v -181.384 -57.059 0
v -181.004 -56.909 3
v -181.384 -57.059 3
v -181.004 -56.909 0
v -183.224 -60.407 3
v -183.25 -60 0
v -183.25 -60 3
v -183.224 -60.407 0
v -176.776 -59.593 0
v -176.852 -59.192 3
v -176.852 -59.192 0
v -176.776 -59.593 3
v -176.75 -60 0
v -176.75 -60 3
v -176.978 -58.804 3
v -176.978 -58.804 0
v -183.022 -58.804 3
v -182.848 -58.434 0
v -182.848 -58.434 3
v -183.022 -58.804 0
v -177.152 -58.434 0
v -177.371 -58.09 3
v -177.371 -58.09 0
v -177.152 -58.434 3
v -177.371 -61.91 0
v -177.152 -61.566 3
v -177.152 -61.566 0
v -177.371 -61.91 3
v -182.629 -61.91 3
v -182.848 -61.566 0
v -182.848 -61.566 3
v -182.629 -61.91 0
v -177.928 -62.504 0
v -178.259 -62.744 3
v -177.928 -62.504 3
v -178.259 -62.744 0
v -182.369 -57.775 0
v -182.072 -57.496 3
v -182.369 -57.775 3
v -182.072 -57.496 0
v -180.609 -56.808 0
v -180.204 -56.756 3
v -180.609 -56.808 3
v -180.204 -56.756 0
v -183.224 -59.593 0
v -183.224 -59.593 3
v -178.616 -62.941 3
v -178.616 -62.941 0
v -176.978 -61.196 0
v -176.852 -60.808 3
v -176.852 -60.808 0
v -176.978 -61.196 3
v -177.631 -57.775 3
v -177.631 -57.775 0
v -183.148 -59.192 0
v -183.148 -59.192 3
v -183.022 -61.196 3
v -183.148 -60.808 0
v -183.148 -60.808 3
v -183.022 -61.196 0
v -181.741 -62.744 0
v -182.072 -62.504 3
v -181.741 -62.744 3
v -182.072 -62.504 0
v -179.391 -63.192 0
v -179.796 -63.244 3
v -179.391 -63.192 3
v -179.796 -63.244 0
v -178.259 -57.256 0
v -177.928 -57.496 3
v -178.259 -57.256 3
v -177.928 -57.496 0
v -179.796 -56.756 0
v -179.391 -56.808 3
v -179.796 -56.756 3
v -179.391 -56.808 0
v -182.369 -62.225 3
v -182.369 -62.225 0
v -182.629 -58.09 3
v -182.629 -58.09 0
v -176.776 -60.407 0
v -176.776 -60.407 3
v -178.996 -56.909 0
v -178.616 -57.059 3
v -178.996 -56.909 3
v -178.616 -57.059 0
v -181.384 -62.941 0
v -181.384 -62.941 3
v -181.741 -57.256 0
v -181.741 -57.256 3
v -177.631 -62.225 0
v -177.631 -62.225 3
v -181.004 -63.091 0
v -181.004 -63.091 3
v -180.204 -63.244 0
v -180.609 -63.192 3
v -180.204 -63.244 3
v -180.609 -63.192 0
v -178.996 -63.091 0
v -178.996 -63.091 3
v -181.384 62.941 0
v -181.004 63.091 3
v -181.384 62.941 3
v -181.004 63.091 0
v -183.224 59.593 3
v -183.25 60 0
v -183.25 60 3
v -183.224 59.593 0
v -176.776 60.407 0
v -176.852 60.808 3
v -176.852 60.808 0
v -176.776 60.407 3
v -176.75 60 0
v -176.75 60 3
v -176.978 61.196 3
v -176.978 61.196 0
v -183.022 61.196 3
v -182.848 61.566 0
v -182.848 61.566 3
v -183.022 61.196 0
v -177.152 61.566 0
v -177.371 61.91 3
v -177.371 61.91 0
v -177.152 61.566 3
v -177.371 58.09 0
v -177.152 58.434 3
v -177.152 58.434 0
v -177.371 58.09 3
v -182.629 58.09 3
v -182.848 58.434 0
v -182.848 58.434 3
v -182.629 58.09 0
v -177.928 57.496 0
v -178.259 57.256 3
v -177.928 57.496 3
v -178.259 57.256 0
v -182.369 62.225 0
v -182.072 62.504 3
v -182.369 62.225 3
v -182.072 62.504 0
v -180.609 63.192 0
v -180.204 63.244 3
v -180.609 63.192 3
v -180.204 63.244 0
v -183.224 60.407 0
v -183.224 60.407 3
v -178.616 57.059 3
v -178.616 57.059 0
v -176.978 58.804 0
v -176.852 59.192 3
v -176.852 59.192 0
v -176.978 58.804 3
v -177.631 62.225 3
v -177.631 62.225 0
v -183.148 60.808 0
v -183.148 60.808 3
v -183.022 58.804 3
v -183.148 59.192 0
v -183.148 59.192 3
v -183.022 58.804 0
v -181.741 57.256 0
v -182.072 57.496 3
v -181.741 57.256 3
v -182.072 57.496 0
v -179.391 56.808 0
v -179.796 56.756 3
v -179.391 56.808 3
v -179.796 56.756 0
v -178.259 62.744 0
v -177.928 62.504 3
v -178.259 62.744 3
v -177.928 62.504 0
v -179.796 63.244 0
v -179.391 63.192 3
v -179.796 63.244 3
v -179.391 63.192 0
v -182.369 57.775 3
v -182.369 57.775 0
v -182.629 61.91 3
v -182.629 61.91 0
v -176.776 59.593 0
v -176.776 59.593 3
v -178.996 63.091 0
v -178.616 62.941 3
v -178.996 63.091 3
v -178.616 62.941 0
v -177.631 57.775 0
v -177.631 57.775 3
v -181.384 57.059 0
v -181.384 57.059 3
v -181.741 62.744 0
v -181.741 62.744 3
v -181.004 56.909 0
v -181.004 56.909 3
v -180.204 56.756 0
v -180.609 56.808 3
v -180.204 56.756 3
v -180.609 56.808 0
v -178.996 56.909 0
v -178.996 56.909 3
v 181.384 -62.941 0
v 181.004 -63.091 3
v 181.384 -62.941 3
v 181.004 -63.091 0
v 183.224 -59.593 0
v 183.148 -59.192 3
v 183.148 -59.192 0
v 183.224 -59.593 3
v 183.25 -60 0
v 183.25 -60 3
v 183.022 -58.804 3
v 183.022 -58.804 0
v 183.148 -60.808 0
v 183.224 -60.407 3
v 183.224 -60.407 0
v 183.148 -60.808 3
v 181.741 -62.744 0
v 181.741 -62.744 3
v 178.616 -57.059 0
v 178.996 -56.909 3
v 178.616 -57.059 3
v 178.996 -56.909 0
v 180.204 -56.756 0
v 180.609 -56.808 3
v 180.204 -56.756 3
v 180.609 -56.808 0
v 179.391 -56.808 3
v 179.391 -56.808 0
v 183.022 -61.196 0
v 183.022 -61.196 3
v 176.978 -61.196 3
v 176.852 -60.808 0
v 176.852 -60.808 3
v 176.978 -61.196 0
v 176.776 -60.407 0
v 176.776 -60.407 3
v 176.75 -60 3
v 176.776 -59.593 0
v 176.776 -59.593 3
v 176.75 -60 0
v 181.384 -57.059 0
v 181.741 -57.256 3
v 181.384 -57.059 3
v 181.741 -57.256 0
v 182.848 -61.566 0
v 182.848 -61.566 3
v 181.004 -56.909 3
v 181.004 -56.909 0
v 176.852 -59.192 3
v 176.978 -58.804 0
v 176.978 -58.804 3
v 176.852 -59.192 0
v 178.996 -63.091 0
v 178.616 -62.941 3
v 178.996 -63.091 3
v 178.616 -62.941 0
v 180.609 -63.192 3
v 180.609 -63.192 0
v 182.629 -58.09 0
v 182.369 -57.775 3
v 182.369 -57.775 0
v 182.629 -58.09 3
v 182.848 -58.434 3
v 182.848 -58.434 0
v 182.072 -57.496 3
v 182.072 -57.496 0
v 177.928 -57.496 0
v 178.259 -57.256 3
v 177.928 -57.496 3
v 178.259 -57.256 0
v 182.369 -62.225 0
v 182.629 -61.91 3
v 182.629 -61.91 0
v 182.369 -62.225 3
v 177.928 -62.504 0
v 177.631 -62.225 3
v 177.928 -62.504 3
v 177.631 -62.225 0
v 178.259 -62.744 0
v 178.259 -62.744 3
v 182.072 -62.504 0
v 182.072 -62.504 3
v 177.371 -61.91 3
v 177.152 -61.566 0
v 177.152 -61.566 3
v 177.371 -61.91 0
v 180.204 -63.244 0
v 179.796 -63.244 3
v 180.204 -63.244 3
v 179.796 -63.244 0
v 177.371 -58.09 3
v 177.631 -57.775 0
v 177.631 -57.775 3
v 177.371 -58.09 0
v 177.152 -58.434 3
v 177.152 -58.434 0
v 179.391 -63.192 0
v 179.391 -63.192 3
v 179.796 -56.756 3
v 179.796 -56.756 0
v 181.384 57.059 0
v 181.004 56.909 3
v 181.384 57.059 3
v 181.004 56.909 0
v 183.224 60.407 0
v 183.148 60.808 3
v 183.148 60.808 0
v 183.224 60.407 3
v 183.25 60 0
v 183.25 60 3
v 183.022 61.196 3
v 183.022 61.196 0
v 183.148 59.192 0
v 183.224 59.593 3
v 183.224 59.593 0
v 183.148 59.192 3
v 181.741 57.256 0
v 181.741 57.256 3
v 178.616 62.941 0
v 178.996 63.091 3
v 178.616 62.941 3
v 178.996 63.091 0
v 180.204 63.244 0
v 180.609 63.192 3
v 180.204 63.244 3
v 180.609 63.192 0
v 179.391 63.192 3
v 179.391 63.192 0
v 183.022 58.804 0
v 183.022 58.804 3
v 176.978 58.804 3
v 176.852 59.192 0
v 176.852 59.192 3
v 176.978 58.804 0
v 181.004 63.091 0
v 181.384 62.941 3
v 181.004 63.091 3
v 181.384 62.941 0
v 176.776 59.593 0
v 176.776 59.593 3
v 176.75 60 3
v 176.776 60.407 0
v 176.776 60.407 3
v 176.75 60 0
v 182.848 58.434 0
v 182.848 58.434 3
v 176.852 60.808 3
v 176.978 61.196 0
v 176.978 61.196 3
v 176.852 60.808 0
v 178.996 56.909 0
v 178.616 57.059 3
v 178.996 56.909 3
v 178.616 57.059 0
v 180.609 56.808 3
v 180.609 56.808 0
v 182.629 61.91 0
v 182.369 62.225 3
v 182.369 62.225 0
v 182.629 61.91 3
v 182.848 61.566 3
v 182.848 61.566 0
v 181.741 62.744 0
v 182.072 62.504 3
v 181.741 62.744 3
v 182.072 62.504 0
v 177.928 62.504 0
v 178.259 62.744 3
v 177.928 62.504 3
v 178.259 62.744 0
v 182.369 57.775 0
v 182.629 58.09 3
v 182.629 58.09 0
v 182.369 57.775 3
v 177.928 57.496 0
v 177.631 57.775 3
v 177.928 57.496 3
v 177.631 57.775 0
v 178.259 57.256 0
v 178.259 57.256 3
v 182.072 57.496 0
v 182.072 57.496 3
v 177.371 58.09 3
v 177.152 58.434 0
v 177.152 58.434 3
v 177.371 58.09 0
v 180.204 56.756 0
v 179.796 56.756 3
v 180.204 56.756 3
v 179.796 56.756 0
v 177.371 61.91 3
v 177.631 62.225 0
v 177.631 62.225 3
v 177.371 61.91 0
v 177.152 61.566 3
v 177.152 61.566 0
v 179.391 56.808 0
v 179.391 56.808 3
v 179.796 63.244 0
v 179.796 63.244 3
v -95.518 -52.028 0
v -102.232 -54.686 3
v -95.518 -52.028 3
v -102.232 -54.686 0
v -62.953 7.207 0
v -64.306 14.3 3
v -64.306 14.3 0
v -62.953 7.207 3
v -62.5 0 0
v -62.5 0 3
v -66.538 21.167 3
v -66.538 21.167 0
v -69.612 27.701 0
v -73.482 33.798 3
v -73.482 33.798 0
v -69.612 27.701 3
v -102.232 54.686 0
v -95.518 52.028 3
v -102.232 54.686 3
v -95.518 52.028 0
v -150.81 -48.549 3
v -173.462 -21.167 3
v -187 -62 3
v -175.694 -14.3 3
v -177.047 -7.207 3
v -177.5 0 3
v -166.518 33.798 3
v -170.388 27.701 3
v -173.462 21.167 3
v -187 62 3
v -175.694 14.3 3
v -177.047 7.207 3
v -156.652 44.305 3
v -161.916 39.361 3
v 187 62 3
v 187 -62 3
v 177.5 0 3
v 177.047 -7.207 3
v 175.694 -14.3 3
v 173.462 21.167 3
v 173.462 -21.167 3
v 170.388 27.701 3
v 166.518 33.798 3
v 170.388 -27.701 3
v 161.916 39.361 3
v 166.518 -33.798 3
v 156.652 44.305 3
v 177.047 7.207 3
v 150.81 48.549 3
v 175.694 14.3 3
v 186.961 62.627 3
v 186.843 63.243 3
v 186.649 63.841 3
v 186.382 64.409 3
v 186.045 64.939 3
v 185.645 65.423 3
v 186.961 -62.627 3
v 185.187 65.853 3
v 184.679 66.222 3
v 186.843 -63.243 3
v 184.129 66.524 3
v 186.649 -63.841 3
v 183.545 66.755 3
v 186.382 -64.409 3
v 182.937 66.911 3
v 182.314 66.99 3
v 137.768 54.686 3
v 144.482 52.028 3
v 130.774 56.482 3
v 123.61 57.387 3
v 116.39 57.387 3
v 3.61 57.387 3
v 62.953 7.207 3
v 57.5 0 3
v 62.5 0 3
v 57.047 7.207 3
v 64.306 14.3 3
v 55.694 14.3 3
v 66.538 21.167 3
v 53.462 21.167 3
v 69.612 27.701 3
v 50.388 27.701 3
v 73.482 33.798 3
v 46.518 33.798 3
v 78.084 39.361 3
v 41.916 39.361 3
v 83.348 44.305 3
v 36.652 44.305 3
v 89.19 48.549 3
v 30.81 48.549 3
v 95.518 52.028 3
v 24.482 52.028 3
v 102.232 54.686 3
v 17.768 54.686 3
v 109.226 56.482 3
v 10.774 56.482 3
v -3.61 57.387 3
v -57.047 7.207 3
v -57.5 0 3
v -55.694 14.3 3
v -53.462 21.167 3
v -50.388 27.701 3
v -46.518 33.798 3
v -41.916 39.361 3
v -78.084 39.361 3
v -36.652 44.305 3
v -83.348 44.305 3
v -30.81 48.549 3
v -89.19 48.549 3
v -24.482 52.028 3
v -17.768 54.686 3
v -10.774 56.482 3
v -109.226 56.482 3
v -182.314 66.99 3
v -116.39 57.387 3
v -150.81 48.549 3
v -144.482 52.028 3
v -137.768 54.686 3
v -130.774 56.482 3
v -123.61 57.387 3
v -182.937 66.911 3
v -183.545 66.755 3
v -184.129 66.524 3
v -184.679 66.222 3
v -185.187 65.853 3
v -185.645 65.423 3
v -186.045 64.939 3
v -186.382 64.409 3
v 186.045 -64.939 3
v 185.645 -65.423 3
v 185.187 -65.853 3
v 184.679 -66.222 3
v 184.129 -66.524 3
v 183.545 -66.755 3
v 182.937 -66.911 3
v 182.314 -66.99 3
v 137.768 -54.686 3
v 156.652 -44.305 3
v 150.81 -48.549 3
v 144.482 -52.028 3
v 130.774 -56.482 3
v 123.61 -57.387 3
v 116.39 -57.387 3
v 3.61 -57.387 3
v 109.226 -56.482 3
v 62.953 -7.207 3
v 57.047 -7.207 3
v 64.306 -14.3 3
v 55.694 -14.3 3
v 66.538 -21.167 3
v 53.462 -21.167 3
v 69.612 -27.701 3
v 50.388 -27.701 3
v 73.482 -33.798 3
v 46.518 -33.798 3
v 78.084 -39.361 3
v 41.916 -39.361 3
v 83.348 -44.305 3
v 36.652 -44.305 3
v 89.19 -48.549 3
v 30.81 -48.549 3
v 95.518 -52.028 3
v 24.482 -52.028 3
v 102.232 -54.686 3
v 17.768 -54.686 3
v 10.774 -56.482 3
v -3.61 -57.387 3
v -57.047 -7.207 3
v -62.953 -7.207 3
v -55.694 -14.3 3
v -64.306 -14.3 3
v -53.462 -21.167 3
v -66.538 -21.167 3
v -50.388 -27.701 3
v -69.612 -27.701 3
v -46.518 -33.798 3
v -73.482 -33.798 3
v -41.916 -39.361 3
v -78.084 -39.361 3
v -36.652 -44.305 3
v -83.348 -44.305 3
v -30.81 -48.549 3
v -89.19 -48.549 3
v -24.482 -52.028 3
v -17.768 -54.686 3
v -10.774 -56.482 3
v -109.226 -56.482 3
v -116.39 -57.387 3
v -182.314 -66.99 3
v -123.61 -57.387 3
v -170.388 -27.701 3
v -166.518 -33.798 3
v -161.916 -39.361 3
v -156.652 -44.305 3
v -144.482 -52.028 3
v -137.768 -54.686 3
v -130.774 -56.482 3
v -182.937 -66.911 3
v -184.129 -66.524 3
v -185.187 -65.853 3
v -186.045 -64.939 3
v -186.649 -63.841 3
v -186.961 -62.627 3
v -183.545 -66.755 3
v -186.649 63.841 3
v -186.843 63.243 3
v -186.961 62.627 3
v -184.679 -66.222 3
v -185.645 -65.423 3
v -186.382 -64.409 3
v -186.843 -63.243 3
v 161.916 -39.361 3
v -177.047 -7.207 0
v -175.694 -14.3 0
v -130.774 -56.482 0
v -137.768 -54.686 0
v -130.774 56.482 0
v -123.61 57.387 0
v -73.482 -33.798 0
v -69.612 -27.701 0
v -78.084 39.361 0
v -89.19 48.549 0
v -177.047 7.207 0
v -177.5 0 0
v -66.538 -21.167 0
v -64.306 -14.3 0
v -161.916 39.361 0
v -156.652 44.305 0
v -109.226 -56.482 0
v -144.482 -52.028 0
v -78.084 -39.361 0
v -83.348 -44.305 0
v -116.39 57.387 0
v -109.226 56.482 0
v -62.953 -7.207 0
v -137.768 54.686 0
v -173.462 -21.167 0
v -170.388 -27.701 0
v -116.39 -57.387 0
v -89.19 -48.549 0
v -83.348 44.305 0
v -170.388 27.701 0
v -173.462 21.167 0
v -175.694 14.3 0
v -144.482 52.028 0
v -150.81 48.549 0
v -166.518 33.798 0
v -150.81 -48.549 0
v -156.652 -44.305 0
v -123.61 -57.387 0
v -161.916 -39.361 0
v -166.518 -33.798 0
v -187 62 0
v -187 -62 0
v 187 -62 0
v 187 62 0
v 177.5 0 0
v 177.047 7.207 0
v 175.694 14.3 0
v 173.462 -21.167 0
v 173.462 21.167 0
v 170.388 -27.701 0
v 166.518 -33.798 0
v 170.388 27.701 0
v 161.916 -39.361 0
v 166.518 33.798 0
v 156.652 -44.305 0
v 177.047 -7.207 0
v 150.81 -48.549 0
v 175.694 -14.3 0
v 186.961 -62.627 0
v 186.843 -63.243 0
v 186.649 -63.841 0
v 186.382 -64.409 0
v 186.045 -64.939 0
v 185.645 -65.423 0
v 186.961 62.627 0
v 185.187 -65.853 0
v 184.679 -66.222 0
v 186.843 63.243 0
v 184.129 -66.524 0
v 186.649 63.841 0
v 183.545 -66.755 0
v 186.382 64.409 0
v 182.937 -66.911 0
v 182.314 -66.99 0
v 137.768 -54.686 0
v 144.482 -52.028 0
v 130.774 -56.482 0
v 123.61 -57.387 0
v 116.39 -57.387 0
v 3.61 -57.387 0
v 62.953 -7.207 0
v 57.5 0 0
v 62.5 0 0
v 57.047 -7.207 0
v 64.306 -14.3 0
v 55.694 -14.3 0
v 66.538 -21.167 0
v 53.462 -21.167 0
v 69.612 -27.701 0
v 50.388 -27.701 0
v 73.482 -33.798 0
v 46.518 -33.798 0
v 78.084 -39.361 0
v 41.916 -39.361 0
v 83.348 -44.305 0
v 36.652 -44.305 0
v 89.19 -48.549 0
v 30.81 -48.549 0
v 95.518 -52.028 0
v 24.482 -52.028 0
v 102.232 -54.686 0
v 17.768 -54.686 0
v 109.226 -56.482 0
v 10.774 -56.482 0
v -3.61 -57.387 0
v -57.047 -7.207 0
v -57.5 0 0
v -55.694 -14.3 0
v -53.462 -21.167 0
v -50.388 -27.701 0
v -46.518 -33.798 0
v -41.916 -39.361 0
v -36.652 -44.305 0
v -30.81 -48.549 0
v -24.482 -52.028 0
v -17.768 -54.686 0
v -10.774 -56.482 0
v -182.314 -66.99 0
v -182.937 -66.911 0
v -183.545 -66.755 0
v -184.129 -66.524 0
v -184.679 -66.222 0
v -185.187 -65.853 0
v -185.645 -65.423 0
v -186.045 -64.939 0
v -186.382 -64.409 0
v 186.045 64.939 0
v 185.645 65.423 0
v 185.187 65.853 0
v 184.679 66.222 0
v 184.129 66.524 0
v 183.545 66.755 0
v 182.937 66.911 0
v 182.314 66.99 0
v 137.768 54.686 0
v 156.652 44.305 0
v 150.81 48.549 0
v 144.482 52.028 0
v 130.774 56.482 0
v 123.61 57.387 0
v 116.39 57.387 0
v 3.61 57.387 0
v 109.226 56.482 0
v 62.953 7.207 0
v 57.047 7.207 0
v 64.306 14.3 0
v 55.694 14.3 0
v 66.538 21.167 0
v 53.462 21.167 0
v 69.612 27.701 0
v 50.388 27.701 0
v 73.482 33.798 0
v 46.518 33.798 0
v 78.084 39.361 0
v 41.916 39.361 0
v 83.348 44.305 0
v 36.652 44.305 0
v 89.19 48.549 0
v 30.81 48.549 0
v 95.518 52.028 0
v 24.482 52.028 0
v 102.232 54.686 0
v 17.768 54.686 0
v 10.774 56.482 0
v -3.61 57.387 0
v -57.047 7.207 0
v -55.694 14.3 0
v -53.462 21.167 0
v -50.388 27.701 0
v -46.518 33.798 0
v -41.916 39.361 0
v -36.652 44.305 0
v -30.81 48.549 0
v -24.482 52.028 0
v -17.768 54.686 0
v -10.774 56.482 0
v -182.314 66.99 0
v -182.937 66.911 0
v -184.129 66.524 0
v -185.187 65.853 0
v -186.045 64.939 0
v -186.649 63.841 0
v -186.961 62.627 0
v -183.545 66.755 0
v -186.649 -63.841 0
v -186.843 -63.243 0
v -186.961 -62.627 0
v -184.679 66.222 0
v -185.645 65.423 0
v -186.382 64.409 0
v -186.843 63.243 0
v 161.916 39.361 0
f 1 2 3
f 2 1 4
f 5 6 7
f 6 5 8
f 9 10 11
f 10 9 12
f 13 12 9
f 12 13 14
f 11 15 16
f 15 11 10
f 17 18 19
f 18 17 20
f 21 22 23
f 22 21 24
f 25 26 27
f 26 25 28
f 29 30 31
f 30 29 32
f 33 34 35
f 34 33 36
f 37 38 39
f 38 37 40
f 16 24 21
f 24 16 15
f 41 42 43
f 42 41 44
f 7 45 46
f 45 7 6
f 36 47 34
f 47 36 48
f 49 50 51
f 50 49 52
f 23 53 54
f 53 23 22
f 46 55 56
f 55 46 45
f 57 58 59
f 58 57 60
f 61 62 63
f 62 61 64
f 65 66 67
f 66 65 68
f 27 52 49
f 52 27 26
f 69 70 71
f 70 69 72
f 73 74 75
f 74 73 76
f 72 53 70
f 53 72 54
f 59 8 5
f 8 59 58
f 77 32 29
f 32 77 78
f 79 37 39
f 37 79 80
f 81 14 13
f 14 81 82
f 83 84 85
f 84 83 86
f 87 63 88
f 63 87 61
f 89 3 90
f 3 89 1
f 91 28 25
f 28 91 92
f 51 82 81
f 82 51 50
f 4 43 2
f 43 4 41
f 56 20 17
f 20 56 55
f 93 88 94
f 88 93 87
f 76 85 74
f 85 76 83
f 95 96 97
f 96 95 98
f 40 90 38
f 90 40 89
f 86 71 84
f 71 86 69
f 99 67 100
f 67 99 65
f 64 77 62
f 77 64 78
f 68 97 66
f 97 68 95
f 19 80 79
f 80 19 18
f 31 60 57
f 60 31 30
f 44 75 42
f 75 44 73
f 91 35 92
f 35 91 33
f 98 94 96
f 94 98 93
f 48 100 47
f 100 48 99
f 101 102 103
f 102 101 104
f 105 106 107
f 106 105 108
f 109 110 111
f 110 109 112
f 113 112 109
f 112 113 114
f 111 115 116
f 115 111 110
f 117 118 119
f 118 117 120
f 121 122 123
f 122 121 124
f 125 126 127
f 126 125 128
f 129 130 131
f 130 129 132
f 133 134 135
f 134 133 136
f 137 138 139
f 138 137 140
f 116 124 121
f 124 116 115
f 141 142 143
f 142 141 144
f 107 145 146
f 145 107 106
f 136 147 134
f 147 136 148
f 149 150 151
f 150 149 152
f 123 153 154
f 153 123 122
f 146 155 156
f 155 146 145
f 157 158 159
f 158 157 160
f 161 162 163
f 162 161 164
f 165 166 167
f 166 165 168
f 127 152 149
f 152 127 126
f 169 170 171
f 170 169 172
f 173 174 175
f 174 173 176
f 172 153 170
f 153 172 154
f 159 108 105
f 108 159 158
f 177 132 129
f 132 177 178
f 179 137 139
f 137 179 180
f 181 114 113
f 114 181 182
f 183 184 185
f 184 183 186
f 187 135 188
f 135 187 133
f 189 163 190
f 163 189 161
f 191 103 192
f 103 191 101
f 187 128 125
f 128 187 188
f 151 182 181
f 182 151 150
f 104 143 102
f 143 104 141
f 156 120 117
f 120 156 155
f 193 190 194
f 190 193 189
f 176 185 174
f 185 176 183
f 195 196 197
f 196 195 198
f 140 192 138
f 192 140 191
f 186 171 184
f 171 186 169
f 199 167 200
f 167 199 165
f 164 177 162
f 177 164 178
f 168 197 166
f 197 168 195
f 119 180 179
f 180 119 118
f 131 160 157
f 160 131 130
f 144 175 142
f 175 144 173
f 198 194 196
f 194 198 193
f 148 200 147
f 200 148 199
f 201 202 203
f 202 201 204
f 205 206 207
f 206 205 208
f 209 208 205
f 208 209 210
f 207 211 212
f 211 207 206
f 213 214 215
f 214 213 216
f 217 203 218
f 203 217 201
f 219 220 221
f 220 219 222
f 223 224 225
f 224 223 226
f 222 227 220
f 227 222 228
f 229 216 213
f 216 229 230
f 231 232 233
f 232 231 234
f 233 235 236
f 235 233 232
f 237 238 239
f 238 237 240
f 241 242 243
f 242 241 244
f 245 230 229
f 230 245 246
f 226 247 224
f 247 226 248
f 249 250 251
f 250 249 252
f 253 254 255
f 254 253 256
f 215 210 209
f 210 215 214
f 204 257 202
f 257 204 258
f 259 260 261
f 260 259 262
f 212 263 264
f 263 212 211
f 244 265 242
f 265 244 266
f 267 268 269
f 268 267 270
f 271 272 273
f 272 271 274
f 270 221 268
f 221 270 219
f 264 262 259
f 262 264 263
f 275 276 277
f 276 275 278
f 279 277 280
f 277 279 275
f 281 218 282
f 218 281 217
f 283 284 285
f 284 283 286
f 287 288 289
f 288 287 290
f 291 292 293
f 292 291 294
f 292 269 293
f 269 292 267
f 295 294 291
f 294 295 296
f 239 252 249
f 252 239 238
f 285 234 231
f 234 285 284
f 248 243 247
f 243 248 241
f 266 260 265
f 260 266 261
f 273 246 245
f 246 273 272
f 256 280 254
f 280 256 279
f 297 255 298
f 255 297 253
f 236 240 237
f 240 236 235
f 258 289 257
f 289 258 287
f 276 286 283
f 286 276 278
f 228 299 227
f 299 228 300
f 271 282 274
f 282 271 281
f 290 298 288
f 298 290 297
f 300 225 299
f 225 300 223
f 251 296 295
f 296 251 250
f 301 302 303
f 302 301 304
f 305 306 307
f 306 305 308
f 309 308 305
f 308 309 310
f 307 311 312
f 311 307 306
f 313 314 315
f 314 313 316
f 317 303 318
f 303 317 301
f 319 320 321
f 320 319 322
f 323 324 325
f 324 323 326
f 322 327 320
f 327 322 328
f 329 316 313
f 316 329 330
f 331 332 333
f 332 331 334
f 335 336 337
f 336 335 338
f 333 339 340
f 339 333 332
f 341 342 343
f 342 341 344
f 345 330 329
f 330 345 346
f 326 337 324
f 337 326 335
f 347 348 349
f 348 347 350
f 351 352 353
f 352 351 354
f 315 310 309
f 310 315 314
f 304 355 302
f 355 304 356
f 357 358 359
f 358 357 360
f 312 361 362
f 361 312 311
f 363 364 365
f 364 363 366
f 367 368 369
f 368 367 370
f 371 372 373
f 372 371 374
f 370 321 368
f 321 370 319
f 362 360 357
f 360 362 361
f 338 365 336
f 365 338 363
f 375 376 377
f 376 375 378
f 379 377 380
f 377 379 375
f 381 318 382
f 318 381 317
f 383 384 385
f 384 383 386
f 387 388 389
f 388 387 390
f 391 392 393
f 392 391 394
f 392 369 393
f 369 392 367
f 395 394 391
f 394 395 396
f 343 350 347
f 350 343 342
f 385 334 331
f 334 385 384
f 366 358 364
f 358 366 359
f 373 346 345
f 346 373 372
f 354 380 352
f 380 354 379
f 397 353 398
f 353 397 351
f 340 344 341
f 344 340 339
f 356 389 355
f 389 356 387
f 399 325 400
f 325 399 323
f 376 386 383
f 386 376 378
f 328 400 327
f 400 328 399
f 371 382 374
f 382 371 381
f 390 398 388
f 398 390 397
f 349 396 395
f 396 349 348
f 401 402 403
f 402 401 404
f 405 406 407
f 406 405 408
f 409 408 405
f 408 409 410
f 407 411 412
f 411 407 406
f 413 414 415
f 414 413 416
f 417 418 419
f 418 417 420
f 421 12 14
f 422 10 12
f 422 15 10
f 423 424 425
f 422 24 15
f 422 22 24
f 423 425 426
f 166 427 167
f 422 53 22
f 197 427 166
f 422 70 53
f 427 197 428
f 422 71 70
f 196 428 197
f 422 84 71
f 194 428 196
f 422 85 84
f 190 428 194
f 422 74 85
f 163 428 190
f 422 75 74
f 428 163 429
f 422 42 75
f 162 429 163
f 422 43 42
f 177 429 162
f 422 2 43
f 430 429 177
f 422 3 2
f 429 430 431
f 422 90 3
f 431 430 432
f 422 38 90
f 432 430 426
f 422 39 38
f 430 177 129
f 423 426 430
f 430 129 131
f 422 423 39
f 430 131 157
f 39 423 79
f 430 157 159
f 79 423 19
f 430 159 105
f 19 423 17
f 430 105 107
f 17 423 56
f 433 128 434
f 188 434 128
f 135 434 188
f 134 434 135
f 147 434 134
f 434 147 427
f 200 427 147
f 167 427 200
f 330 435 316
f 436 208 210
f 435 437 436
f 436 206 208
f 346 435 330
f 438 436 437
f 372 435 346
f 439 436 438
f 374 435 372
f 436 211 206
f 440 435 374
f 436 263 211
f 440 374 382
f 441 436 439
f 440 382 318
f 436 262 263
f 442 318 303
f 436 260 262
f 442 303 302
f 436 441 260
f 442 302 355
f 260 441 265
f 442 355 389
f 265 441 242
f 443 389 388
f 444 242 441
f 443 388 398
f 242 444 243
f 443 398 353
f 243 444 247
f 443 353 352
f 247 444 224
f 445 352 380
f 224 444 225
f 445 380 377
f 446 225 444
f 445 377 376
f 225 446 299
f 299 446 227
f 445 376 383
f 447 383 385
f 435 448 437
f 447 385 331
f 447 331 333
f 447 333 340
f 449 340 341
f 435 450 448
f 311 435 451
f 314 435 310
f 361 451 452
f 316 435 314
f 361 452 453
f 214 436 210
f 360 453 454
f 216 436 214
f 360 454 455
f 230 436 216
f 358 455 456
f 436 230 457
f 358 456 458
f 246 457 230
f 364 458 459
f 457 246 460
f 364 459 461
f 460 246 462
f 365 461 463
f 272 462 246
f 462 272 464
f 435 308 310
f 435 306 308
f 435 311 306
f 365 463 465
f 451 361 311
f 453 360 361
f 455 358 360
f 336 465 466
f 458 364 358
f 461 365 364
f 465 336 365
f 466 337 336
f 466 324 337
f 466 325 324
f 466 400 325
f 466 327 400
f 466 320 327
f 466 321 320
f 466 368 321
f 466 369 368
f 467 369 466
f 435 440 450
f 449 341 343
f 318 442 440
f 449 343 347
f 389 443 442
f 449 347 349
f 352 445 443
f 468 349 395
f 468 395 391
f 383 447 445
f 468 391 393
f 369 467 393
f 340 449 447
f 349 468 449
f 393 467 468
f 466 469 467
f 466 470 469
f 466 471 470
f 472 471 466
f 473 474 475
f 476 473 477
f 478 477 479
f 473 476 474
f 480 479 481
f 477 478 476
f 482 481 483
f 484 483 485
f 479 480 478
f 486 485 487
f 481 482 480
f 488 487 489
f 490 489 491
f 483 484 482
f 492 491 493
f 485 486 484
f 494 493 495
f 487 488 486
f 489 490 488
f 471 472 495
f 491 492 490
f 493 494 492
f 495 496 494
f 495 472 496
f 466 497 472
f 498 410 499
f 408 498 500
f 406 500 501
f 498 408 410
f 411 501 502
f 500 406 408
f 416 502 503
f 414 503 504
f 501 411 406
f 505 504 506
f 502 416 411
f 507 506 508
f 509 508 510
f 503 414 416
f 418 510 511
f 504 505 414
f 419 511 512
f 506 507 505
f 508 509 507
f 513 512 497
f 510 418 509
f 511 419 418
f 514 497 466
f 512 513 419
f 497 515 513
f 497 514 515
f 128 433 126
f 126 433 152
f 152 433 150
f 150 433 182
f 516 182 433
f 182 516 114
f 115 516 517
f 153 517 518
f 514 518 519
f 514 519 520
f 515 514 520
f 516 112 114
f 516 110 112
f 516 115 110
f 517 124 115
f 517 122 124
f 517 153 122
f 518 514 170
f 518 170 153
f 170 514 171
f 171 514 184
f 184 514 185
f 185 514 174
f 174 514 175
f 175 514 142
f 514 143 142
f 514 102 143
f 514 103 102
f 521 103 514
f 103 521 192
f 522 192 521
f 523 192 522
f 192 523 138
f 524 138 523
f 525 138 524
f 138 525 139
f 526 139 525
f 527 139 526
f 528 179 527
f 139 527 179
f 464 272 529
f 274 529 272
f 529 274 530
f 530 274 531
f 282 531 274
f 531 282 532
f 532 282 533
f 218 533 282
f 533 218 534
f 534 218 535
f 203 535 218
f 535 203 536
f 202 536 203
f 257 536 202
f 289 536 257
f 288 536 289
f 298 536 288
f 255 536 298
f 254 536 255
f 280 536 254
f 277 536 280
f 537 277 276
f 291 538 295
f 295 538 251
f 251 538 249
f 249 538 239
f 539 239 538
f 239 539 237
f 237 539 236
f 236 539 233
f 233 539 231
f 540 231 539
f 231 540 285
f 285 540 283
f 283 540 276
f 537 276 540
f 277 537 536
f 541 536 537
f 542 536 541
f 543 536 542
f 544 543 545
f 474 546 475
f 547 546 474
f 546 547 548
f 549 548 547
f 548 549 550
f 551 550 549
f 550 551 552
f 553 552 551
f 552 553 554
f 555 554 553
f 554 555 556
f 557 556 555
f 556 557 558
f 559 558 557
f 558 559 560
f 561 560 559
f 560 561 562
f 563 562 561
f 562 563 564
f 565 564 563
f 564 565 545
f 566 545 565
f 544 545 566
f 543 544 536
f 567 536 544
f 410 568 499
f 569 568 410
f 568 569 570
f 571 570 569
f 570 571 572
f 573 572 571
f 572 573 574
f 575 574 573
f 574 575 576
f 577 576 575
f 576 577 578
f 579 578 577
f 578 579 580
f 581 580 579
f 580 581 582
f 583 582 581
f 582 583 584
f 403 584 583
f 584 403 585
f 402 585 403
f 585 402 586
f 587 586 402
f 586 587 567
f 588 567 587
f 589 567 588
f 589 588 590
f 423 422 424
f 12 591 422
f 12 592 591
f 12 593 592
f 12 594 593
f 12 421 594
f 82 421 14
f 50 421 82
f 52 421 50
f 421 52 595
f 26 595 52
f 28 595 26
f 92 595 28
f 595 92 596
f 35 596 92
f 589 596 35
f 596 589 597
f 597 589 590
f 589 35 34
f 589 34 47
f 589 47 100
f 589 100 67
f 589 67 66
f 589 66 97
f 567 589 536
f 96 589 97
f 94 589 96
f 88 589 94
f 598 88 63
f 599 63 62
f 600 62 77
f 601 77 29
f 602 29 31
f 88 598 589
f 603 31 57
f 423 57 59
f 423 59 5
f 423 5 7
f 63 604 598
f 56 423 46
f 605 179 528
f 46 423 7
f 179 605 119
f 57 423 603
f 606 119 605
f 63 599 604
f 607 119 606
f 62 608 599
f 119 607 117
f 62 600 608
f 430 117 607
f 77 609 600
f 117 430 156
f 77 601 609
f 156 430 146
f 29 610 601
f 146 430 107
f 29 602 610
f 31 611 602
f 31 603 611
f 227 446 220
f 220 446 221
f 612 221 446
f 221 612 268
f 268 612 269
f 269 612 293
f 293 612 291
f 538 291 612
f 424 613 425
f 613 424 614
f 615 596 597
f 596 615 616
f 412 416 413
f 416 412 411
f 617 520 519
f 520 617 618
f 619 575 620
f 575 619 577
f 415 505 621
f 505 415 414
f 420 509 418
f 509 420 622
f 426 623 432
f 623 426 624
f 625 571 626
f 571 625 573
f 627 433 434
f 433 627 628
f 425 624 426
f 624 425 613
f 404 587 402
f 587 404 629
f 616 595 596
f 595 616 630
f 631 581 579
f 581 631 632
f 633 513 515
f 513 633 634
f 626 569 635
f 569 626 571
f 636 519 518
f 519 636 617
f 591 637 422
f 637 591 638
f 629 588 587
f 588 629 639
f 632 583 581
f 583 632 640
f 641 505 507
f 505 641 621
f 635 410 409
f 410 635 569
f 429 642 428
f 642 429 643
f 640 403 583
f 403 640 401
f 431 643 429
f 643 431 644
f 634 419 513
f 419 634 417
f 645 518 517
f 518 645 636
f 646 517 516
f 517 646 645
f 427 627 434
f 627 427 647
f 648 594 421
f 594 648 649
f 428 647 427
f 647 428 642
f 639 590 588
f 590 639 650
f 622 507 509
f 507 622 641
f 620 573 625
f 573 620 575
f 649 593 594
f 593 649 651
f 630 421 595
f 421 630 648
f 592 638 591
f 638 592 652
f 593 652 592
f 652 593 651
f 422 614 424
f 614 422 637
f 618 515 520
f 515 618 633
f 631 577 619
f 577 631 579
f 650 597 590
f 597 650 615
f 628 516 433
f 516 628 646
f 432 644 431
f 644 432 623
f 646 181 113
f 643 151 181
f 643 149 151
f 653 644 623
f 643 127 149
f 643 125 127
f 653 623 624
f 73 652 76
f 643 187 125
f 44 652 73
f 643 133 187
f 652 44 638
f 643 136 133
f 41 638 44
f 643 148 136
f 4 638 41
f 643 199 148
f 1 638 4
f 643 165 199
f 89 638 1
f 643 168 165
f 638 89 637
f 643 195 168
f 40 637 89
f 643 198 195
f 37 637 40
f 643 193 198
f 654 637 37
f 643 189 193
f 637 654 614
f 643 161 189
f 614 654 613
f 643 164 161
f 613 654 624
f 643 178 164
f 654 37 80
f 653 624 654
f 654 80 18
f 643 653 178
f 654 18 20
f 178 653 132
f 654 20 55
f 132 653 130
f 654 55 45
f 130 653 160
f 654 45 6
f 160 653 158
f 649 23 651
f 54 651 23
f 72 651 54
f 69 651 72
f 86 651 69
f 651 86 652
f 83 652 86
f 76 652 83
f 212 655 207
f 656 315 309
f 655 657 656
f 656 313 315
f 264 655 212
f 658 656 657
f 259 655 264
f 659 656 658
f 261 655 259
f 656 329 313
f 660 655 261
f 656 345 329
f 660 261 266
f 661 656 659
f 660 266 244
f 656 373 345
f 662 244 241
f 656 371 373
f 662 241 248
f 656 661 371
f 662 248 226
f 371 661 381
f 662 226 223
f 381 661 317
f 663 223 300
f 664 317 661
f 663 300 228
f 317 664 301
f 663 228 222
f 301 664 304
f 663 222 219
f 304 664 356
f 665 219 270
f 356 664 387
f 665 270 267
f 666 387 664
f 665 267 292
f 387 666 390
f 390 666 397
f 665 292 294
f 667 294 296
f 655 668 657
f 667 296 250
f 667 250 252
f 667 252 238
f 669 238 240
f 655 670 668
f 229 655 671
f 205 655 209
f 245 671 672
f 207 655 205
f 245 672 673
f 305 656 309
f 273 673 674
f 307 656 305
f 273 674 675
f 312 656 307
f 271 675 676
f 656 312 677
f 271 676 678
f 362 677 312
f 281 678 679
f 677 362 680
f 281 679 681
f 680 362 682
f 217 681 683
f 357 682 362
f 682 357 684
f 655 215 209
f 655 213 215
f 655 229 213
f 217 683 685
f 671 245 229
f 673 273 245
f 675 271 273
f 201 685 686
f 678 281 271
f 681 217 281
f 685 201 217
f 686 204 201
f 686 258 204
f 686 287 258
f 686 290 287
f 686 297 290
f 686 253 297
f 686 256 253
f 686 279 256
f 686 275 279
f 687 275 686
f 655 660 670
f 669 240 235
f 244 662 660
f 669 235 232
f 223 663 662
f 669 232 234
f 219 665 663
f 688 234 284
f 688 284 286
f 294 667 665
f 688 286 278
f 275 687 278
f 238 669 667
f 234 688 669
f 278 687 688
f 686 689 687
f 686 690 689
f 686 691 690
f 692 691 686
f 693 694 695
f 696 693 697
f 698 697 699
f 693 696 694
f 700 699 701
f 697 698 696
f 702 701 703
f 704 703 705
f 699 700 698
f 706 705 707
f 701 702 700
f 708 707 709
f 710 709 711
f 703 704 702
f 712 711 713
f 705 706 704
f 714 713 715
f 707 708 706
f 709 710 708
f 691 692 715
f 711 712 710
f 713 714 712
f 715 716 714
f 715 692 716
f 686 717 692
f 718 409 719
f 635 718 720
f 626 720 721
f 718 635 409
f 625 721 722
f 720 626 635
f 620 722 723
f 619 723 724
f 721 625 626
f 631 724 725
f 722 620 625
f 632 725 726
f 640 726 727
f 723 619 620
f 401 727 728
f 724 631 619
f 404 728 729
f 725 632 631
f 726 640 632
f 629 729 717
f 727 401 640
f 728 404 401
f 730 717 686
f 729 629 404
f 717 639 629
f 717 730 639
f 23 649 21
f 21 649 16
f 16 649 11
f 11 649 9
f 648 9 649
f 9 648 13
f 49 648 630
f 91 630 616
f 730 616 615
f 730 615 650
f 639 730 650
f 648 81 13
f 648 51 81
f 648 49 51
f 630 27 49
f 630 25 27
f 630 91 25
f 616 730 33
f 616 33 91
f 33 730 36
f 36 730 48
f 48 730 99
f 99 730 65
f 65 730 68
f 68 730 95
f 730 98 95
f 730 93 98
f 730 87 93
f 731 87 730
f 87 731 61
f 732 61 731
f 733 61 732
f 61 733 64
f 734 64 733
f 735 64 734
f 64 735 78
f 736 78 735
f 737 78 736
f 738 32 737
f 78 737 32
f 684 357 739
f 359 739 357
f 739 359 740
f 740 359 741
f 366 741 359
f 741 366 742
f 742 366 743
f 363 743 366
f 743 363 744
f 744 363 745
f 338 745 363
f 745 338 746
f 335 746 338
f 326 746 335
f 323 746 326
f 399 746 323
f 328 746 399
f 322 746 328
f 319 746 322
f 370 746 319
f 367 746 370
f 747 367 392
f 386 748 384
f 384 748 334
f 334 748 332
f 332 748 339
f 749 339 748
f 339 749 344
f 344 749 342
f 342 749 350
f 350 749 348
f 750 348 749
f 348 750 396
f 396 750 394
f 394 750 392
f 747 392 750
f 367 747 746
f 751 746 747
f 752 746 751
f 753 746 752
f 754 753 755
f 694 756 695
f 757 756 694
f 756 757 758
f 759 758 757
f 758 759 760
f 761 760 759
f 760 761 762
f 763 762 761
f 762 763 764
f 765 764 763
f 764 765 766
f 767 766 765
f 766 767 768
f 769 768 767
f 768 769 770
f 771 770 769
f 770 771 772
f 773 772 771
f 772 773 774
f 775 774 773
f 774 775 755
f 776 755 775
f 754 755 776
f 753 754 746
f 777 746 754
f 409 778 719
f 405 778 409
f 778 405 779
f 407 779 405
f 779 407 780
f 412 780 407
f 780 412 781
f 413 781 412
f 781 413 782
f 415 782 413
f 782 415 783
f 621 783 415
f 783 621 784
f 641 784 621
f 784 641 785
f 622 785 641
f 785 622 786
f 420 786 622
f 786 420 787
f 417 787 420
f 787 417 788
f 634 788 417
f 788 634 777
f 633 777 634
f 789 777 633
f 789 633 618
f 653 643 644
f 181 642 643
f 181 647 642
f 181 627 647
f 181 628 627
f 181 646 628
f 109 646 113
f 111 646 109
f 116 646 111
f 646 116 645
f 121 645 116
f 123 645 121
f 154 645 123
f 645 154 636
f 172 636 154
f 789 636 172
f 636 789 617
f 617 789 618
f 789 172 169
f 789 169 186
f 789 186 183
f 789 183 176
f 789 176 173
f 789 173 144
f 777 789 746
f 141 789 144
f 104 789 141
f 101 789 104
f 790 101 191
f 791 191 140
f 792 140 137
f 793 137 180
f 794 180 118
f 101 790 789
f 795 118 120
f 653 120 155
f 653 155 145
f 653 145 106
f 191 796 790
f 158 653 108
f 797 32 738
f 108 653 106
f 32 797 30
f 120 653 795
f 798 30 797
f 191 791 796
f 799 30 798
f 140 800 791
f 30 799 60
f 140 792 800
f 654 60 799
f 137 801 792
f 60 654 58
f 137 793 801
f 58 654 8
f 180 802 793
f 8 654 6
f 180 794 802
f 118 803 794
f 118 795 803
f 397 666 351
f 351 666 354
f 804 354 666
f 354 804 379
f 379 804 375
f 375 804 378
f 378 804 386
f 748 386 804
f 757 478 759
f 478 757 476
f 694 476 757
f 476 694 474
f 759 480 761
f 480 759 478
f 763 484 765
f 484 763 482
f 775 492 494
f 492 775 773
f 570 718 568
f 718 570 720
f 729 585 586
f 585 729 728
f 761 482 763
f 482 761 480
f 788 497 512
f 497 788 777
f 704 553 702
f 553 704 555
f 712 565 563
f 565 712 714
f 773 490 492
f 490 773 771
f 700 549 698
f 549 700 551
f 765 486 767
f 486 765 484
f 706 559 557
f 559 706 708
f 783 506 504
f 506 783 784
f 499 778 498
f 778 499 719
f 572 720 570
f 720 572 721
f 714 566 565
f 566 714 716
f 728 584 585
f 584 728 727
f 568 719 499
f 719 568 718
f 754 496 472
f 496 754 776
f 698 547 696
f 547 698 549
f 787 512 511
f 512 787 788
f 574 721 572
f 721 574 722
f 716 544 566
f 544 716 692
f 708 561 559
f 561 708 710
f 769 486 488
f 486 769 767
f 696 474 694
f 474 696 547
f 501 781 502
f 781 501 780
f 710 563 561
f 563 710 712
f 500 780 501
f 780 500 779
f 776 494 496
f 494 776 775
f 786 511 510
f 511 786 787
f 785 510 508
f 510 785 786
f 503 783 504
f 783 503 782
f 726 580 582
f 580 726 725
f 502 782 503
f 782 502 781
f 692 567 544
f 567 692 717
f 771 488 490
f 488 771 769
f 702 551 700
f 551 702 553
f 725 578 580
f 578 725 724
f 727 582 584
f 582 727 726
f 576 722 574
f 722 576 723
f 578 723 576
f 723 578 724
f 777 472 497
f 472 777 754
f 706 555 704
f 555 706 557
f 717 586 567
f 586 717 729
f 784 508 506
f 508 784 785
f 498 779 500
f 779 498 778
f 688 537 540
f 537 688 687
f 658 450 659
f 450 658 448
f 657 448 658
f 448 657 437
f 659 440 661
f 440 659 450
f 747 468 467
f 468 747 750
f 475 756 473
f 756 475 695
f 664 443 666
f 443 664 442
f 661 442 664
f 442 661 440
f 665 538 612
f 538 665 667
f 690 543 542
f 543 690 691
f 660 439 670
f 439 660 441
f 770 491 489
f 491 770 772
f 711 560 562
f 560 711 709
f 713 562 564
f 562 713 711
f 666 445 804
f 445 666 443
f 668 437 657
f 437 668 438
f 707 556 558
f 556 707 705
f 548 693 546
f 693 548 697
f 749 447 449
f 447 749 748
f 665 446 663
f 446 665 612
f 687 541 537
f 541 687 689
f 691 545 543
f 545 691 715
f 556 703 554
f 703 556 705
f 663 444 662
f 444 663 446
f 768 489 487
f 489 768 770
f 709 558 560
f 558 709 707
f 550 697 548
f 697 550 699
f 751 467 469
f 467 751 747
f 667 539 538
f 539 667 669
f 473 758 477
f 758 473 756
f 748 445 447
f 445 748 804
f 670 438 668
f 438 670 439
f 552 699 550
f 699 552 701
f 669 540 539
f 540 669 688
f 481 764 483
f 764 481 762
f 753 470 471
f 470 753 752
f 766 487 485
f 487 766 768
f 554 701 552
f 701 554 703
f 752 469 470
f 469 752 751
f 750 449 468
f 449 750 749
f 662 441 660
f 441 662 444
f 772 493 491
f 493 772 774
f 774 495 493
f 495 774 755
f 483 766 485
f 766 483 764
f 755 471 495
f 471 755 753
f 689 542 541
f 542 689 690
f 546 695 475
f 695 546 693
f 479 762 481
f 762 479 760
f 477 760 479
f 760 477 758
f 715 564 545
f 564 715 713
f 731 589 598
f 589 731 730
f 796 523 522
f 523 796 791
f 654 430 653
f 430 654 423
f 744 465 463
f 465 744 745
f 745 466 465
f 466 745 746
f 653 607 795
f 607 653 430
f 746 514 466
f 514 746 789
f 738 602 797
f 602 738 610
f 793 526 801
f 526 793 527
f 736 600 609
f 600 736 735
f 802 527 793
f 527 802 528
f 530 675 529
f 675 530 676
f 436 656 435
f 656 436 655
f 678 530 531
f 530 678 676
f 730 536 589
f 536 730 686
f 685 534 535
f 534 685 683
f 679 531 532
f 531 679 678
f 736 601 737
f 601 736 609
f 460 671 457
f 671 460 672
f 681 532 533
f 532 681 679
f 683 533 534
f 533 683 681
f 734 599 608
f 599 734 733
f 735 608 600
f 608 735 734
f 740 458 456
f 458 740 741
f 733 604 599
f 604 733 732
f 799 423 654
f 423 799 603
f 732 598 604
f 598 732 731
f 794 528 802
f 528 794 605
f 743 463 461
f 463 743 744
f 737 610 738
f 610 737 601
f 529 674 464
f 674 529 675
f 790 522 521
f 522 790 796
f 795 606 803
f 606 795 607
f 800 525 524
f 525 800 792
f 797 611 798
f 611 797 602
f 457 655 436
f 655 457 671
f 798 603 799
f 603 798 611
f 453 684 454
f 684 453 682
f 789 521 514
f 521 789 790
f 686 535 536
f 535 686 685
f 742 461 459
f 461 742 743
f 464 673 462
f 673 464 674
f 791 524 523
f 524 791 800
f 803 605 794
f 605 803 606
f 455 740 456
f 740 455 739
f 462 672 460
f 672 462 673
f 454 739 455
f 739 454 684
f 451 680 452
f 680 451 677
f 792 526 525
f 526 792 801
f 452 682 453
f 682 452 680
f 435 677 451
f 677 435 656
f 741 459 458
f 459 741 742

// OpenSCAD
$fn = 50;

difference() {
	union() {
		hull() {
			translate(v = [-182.0, 62.0, 0]) {
				cylinder(h = 3, r = 5);
			}
			translate(v = [182.0, 62.0, 0]) {
				cylinder(h = 3, r = 5);
			}
			translate(v = [-182.0, -62.0, 0]) {
				cylinder(h = 3, r = 5);
			}
			translate(v = [182.0, -62.0, 0]) {
				cylinder(h = 3, r = 5);
			}
		}
	}
	union() {
		translate(v = [-180.0, -60.0, -100.0]) {
			cylinder(h = 200, r = 3.25);
		}
		translate(v = [-180.0, 60.0, -100.0]) {
			cylinder(h = 200, r = 3.25);
		}
		translate(v = [180.0, -60.0, -100.0]) {
			cylinder(h = 200, r = 3.25);
		}
		translate(v = [180.0, 60.0, -100.0]) {
			cylinder(h = 200, r = 3.25);
		}
		translate(v = [-180.0, -60.0, -100.0]) {
			cylinder(h = 200, r = 1.8);
		}
		translate(v = [-180.0, 60.0, -100.0]) {
			cylinder(h = 200, r = 1.8);
		}
		translate(v = [180.0, -60.0, -100.0]) {
			cylinder(h = 200, r = 1.8);
		}
		translate(v = [180.0, 60.0, -100.0]) {
			cylinder(h = 200, r = 1.8);
		}
		translate(v = [-120.0, 0, 0.0]) {
			cylinder(h = 3, r = 57.5);
		}
		cylinder(h = 3, r = 57.5);
		translate(v = [120.0, 0, 0.0]) {
			cylinder(h = 3, r = 57.5);
		}
	}
}
